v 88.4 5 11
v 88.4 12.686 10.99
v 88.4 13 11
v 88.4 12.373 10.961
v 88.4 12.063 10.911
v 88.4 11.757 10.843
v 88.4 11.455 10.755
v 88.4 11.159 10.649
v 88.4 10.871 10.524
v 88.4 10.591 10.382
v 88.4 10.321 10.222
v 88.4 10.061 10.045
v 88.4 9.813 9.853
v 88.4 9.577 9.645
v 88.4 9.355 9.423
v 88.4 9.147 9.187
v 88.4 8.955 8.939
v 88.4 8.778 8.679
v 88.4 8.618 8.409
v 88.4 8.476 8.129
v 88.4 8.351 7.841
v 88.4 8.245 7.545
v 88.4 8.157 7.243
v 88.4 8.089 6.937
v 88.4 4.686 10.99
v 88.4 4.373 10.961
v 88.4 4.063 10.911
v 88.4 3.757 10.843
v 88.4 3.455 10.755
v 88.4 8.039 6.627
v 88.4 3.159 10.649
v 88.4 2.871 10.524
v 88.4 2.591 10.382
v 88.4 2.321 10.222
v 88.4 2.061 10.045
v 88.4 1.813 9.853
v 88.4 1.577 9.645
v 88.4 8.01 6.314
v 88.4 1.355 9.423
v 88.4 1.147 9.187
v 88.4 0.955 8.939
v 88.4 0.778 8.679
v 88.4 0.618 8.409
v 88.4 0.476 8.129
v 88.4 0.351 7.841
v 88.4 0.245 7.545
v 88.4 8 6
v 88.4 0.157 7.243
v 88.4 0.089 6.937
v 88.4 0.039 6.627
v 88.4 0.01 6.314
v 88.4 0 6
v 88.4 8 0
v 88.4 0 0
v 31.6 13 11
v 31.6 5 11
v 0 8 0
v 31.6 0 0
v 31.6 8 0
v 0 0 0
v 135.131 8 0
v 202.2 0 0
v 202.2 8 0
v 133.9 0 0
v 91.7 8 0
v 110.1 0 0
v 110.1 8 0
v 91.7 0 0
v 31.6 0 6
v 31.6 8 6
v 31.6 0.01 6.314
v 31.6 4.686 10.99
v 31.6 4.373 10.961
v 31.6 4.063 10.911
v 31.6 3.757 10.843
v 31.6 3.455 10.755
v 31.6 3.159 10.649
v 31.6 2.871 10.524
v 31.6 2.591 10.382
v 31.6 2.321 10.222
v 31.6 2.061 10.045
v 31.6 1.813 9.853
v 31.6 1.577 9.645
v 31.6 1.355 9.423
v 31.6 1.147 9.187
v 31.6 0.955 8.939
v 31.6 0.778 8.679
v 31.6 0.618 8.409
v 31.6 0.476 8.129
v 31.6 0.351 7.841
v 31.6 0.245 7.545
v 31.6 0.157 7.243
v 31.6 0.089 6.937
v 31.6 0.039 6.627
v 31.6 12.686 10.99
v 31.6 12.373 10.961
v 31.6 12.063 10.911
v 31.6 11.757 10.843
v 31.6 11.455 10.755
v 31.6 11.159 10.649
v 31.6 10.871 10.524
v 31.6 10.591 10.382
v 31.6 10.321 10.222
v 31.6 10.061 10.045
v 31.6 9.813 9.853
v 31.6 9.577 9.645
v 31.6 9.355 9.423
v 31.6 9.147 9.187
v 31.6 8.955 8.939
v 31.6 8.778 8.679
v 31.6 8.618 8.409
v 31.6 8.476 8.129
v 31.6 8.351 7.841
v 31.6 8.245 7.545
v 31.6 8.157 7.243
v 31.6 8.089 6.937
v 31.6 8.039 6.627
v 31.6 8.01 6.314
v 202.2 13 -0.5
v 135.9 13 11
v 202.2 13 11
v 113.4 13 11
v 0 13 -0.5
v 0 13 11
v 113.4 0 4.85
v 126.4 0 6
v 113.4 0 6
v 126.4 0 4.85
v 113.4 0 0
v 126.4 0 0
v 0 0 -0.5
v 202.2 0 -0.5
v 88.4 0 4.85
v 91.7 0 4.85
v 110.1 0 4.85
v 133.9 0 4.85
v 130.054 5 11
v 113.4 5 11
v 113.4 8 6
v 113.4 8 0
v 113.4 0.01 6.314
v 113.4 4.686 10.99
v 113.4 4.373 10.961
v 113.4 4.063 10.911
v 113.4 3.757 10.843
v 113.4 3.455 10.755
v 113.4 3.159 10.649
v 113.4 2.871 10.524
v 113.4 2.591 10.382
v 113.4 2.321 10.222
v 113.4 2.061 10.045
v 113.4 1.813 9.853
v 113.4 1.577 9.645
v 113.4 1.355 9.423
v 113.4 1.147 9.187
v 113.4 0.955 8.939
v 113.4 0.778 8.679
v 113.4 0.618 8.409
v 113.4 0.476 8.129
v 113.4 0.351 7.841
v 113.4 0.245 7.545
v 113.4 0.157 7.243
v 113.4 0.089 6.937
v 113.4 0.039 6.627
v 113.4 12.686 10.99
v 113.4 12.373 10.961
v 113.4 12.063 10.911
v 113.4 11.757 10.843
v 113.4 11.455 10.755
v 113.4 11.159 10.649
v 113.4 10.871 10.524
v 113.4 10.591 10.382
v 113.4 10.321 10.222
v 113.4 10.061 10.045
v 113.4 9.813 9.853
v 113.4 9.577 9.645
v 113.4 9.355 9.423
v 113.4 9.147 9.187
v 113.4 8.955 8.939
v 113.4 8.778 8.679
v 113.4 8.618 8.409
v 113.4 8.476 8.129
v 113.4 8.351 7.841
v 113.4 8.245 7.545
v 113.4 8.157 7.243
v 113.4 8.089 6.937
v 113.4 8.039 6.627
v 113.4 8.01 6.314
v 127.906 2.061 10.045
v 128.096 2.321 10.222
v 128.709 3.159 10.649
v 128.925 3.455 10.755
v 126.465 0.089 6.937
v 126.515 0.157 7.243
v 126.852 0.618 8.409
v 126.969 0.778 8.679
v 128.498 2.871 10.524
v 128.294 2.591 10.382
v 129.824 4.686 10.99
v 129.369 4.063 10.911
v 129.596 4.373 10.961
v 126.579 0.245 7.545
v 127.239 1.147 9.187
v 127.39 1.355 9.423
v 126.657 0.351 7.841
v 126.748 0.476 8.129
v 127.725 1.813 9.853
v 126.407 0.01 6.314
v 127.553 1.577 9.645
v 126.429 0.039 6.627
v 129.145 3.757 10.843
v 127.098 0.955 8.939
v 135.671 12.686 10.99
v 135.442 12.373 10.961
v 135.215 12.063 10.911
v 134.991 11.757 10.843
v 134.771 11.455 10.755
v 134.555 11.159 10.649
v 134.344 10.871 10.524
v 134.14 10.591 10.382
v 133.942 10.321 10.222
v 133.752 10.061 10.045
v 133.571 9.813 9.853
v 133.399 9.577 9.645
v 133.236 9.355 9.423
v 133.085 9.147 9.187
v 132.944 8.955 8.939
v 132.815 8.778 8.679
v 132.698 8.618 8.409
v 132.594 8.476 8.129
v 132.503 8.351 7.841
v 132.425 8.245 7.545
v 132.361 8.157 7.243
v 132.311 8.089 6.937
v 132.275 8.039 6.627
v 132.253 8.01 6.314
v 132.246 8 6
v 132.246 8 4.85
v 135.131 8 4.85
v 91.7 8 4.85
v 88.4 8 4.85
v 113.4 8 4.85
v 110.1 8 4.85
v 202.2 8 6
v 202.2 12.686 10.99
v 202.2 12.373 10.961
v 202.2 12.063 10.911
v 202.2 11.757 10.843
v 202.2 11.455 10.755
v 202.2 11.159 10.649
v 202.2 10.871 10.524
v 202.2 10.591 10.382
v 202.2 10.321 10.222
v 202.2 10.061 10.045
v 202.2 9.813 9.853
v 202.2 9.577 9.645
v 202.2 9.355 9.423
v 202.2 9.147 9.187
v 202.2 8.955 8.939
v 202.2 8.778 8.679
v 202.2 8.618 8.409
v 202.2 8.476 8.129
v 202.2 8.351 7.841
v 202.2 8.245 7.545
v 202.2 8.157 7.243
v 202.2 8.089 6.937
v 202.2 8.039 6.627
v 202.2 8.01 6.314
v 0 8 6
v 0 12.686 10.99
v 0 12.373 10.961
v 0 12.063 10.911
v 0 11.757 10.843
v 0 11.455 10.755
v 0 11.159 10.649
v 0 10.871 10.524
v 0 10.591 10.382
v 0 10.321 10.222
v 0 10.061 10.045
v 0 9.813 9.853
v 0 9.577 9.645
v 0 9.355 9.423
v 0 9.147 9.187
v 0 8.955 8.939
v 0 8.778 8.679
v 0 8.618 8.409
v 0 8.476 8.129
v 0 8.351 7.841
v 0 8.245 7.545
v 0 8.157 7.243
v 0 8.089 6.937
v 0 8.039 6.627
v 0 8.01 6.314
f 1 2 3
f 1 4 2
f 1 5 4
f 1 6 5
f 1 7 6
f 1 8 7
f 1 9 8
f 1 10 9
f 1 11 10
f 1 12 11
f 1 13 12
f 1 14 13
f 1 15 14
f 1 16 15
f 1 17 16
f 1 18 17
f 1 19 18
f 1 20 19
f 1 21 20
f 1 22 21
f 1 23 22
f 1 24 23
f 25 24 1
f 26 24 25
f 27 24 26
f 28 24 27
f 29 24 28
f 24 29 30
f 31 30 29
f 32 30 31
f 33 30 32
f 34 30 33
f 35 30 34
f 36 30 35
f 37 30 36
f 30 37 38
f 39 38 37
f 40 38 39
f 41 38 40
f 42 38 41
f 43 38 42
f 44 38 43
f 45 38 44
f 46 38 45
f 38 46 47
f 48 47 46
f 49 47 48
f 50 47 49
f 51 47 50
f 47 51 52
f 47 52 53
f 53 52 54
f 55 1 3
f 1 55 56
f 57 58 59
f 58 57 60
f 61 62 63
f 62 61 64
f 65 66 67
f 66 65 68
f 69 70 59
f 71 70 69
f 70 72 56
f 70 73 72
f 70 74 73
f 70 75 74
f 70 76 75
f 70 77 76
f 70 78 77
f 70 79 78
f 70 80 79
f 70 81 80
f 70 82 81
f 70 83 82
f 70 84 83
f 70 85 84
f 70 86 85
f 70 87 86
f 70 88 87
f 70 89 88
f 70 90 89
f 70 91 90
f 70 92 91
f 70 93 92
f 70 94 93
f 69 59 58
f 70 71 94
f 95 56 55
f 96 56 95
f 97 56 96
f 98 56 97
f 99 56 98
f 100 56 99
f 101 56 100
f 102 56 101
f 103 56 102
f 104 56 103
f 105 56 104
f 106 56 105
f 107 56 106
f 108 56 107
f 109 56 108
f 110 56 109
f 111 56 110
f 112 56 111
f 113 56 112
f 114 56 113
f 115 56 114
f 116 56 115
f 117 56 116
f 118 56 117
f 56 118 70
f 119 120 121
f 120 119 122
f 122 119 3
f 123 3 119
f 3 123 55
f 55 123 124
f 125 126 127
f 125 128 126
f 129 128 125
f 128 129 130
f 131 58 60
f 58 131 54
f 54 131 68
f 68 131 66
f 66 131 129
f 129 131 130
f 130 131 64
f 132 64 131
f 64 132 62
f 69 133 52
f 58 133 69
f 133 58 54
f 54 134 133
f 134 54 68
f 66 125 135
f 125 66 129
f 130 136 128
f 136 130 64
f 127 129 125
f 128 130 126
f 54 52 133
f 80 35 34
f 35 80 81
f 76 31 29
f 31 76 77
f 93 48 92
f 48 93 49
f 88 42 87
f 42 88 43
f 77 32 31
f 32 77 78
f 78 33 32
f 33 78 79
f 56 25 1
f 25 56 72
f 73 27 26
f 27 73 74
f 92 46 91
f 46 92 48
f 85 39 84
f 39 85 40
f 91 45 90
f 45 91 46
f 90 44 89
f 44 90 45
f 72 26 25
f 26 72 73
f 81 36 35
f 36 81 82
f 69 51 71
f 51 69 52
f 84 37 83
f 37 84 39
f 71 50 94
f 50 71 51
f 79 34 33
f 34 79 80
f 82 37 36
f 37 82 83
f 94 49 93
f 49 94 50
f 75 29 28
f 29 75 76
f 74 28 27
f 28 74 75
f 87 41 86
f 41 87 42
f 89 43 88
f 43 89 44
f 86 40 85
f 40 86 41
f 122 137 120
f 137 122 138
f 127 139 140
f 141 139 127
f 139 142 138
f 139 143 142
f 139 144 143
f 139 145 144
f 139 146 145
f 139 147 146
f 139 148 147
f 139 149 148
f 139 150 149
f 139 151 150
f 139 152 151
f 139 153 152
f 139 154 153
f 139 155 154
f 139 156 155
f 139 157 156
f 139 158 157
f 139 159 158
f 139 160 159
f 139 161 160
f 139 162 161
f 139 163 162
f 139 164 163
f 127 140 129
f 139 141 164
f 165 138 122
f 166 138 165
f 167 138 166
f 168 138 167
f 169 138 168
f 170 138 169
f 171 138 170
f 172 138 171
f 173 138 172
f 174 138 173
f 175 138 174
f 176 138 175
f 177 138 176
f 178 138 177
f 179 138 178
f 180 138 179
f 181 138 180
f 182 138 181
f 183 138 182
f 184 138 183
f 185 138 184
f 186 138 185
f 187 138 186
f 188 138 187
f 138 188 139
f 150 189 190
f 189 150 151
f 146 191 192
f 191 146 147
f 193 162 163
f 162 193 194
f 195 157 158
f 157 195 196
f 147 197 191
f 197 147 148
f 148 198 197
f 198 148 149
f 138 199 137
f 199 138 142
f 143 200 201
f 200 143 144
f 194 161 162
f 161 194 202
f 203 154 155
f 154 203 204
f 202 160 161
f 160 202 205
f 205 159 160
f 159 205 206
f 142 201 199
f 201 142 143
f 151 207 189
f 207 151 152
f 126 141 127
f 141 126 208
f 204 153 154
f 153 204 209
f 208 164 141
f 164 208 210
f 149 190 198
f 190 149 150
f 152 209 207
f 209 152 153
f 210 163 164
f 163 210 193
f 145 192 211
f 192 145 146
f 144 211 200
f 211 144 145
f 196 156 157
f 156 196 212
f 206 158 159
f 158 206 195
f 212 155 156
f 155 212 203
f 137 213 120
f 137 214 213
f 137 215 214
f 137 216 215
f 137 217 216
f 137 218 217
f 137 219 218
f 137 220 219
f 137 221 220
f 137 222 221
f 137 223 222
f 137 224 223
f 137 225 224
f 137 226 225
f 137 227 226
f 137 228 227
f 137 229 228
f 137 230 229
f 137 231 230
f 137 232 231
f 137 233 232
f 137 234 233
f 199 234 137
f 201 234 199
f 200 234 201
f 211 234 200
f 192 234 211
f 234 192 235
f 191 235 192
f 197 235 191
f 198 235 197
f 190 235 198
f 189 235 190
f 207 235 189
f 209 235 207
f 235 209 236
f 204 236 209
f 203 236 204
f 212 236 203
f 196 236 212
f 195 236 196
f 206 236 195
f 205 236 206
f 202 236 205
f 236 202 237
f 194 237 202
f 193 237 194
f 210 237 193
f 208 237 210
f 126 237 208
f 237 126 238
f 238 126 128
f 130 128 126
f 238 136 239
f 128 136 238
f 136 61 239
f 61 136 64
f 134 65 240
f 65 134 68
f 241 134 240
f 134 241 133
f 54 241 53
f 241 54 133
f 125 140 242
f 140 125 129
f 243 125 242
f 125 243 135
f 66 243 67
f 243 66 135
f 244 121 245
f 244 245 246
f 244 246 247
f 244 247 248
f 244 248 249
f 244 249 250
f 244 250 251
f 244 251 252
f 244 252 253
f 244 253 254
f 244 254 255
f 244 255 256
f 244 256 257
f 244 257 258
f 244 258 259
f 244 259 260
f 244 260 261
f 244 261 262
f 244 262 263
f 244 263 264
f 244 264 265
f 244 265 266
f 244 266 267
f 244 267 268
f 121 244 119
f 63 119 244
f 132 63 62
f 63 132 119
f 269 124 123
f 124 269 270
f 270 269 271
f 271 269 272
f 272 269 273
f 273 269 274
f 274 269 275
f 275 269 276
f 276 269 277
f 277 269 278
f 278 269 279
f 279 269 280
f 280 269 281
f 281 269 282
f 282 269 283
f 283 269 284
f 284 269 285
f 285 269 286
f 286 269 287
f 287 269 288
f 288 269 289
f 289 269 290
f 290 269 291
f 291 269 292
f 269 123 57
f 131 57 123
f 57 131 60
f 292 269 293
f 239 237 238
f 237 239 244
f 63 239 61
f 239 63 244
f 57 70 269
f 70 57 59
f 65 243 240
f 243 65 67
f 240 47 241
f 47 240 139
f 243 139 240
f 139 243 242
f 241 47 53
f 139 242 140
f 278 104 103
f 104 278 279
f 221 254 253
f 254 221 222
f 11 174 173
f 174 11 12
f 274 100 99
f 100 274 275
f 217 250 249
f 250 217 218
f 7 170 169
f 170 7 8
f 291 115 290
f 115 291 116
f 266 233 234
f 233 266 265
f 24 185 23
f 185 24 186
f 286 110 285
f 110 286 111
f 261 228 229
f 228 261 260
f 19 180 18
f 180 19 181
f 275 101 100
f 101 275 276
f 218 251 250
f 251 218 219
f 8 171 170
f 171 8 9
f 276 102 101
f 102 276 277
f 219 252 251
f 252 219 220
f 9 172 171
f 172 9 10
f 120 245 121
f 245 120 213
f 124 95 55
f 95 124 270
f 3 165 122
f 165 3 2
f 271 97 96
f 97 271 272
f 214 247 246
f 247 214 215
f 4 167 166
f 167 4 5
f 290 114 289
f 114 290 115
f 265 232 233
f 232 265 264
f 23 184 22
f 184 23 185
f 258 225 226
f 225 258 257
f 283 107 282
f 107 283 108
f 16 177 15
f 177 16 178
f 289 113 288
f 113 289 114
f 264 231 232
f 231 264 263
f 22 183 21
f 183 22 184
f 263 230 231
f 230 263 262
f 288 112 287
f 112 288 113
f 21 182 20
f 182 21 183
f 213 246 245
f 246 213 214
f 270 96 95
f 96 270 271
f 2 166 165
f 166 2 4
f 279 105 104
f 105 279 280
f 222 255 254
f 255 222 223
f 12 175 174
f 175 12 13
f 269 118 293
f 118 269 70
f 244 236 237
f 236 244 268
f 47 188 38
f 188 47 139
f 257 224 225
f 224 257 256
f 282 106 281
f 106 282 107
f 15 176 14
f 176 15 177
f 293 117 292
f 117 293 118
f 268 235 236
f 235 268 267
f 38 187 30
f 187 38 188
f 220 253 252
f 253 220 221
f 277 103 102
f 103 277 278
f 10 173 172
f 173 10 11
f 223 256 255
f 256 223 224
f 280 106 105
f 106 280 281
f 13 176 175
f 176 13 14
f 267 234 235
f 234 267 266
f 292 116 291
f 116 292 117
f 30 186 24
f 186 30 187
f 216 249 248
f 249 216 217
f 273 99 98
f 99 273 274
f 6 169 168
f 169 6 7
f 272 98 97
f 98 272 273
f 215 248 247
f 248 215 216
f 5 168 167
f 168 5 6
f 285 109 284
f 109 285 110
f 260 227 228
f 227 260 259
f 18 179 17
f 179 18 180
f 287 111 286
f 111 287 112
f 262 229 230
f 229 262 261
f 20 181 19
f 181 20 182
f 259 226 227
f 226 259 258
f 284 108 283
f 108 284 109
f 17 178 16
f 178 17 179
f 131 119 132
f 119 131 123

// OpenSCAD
// file: utils.scad
module roundcube(size,r)
{
	scale([1,1,1/2])
	difference()
	{
		translate([r,r,0])
		minkowski()
		{
			cube([size[0]-2*r,size[1]-2*r,size[2]]);
			cylinder(h=size[2],r=r);
		}
	}
}
module chamfercube(size,chamf)
{
	difference()
	{
		cube(size);
		translate([size[0]/2,size[1]/2])
		for (i=[0:3])
		{
			translate([	cos(90*i)*(size[0]/2)-sin(90*i)*(size[0]/2),
						sin(90*i)*(size[1]/2)+cos(90*i)*(size[1]/2),0])
				cylinder(h=size[2],r=chamf,$fn=4);
		}
	}
}
module roundcube1(size,r)
{
	difference()
	{
		cube(size);
		translate([-1,-1,size[2]-r])
			cube([size[0]+2,r+1,r+2]);
	}
	translate([0,r,size[2]-r])
		intersection()
		{
			rotate(90,[0,1,0])
				cylinder(h=size[0],r=r);
			translate([0,-r,0])
				cube([size[0],r,r]);
		}
}
// main file
$fn=100;
use <utils.scad>;

connector_top();

module connector_top()
{
	height=11; flatheight=0.5; heightm=4.85;
	widthl=31.6; widthl2=56.8; widthm=25; widthm0=3.3; widthm1=18.4;
	widthm2s=13; widthm2e=22.5; widthr1=2; widthr=66.3;
	depth=8;
	radius=5;

	widthtot=widthl+widthl2+widthm+widthm2e+widthr;

	translate([0,0,-flatheight])
		cube([widthtot,depth+radius,flatheight]);
	translate([widthl,0,0])
		roundcube1([widthl2,depth+radius,height],radius);
	translate([widthl+widthl2+widthm,0,0])
		difference()
		{
			roundcube1([widthm2e,depth+radius,height],radius);
			translate([widthm2e,depth+radius,0])
				rotate(-90-atan((widthm2e-widthm2s)/(depth+radius)),[0,0,1])
					cube([sqrt(pow(widthm2e-widthm2s,2)+pow(depth+radius,2)),100,height+0.1]);
		}
	translate([widthl+widthl2+widthm+widthm2s,0,0])
		difference()
		{
			cube([widthm2e-widthm2s,depth+radius,heightm]);
			translate([widthm2e-widthm2s,depth+radius,0])
				rotate(-90-atan((widthr1)/(depth+radius)),[0,0,1])
					cube([sqrt(pow(widthr1,2)+pow(depth+radius,2)),100,heightm+0.1]);
		}
	for (i=[0,1])
	{
		translate([widthl+widthl2,0,0])
			translate([i*(widthm-widthm0),0,0])
				cube([widthm0,depth+radius,heightm]);
	}
	translate([0,depth,0])
		roundcube1([widthtot,radius,height],radius);
}
